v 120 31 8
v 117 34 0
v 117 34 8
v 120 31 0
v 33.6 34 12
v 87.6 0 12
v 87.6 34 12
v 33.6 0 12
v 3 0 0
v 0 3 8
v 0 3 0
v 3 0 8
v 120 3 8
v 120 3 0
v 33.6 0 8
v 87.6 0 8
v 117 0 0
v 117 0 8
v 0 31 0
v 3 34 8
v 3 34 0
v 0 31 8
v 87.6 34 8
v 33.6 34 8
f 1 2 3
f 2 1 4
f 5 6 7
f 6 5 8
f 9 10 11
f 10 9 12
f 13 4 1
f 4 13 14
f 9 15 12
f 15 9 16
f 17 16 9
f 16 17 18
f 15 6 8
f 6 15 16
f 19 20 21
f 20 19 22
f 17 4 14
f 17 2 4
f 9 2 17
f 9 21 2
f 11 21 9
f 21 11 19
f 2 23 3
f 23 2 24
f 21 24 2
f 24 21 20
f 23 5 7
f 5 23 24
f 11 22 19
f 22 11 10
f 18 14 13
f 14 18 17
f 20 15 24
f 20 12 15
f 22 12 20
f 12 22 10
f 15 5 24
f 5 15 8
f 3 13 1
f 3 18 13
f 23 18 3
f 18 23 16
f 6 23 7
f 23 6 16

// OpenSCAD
$fn = 32;

// ----------------------------------------------------------------------
// Stepped bar: centerstep, 120 x 34 x 12/8 mm
// ----------------------------------------------------------------------

// --- parameters (mm) ---
bar_l = 120;              // bar length, X
bar_w = 34;               // bar width, Y
plate_t = 12;             // thickness of the thick zone, Z
thin_t = 8;               // thickness of the thin zone
corner_c = 3;             // corner chamfer of the bar
step_cut = 4;             // material removed from the thin zone
thick_from = 33.6;        // start of the thick middle zone
thick_to = 87.6;          // end of the thick middle zone
depth_1 = 4;              // depth of cut 1 from the top face
depth_2 = 4;              // depth of cut 2 from the top face

profile = [[3, 0], [117, 0], [120, 3], [120, 31], [117, 34], [3, 34], [0, 31], [0, 3]];  // primary outline, 8 points, counter clockwise
void_1 = [[-1, -1], [33.6, -1], [33.6, 35], [-1, 35]];  // thin left end, 4 points
void_2 = [[87.6, -1], [121, -1], [121, 35], [87.6, 35]];  // thin right end, 4 points

// --- the one profile operation ---
difference() {
  linear_extrude(height = plate_t) polygon(points = profile);
  translate([0, 0, plate_t - depth_1])
    linear_extrude(height = depth_1 + 1) polygon(points = void_1);
  translate([0, 0, plate_t - depth_2])
    linear_extrude(height = depth_2 + 1) polygon(points = void_2);
}
